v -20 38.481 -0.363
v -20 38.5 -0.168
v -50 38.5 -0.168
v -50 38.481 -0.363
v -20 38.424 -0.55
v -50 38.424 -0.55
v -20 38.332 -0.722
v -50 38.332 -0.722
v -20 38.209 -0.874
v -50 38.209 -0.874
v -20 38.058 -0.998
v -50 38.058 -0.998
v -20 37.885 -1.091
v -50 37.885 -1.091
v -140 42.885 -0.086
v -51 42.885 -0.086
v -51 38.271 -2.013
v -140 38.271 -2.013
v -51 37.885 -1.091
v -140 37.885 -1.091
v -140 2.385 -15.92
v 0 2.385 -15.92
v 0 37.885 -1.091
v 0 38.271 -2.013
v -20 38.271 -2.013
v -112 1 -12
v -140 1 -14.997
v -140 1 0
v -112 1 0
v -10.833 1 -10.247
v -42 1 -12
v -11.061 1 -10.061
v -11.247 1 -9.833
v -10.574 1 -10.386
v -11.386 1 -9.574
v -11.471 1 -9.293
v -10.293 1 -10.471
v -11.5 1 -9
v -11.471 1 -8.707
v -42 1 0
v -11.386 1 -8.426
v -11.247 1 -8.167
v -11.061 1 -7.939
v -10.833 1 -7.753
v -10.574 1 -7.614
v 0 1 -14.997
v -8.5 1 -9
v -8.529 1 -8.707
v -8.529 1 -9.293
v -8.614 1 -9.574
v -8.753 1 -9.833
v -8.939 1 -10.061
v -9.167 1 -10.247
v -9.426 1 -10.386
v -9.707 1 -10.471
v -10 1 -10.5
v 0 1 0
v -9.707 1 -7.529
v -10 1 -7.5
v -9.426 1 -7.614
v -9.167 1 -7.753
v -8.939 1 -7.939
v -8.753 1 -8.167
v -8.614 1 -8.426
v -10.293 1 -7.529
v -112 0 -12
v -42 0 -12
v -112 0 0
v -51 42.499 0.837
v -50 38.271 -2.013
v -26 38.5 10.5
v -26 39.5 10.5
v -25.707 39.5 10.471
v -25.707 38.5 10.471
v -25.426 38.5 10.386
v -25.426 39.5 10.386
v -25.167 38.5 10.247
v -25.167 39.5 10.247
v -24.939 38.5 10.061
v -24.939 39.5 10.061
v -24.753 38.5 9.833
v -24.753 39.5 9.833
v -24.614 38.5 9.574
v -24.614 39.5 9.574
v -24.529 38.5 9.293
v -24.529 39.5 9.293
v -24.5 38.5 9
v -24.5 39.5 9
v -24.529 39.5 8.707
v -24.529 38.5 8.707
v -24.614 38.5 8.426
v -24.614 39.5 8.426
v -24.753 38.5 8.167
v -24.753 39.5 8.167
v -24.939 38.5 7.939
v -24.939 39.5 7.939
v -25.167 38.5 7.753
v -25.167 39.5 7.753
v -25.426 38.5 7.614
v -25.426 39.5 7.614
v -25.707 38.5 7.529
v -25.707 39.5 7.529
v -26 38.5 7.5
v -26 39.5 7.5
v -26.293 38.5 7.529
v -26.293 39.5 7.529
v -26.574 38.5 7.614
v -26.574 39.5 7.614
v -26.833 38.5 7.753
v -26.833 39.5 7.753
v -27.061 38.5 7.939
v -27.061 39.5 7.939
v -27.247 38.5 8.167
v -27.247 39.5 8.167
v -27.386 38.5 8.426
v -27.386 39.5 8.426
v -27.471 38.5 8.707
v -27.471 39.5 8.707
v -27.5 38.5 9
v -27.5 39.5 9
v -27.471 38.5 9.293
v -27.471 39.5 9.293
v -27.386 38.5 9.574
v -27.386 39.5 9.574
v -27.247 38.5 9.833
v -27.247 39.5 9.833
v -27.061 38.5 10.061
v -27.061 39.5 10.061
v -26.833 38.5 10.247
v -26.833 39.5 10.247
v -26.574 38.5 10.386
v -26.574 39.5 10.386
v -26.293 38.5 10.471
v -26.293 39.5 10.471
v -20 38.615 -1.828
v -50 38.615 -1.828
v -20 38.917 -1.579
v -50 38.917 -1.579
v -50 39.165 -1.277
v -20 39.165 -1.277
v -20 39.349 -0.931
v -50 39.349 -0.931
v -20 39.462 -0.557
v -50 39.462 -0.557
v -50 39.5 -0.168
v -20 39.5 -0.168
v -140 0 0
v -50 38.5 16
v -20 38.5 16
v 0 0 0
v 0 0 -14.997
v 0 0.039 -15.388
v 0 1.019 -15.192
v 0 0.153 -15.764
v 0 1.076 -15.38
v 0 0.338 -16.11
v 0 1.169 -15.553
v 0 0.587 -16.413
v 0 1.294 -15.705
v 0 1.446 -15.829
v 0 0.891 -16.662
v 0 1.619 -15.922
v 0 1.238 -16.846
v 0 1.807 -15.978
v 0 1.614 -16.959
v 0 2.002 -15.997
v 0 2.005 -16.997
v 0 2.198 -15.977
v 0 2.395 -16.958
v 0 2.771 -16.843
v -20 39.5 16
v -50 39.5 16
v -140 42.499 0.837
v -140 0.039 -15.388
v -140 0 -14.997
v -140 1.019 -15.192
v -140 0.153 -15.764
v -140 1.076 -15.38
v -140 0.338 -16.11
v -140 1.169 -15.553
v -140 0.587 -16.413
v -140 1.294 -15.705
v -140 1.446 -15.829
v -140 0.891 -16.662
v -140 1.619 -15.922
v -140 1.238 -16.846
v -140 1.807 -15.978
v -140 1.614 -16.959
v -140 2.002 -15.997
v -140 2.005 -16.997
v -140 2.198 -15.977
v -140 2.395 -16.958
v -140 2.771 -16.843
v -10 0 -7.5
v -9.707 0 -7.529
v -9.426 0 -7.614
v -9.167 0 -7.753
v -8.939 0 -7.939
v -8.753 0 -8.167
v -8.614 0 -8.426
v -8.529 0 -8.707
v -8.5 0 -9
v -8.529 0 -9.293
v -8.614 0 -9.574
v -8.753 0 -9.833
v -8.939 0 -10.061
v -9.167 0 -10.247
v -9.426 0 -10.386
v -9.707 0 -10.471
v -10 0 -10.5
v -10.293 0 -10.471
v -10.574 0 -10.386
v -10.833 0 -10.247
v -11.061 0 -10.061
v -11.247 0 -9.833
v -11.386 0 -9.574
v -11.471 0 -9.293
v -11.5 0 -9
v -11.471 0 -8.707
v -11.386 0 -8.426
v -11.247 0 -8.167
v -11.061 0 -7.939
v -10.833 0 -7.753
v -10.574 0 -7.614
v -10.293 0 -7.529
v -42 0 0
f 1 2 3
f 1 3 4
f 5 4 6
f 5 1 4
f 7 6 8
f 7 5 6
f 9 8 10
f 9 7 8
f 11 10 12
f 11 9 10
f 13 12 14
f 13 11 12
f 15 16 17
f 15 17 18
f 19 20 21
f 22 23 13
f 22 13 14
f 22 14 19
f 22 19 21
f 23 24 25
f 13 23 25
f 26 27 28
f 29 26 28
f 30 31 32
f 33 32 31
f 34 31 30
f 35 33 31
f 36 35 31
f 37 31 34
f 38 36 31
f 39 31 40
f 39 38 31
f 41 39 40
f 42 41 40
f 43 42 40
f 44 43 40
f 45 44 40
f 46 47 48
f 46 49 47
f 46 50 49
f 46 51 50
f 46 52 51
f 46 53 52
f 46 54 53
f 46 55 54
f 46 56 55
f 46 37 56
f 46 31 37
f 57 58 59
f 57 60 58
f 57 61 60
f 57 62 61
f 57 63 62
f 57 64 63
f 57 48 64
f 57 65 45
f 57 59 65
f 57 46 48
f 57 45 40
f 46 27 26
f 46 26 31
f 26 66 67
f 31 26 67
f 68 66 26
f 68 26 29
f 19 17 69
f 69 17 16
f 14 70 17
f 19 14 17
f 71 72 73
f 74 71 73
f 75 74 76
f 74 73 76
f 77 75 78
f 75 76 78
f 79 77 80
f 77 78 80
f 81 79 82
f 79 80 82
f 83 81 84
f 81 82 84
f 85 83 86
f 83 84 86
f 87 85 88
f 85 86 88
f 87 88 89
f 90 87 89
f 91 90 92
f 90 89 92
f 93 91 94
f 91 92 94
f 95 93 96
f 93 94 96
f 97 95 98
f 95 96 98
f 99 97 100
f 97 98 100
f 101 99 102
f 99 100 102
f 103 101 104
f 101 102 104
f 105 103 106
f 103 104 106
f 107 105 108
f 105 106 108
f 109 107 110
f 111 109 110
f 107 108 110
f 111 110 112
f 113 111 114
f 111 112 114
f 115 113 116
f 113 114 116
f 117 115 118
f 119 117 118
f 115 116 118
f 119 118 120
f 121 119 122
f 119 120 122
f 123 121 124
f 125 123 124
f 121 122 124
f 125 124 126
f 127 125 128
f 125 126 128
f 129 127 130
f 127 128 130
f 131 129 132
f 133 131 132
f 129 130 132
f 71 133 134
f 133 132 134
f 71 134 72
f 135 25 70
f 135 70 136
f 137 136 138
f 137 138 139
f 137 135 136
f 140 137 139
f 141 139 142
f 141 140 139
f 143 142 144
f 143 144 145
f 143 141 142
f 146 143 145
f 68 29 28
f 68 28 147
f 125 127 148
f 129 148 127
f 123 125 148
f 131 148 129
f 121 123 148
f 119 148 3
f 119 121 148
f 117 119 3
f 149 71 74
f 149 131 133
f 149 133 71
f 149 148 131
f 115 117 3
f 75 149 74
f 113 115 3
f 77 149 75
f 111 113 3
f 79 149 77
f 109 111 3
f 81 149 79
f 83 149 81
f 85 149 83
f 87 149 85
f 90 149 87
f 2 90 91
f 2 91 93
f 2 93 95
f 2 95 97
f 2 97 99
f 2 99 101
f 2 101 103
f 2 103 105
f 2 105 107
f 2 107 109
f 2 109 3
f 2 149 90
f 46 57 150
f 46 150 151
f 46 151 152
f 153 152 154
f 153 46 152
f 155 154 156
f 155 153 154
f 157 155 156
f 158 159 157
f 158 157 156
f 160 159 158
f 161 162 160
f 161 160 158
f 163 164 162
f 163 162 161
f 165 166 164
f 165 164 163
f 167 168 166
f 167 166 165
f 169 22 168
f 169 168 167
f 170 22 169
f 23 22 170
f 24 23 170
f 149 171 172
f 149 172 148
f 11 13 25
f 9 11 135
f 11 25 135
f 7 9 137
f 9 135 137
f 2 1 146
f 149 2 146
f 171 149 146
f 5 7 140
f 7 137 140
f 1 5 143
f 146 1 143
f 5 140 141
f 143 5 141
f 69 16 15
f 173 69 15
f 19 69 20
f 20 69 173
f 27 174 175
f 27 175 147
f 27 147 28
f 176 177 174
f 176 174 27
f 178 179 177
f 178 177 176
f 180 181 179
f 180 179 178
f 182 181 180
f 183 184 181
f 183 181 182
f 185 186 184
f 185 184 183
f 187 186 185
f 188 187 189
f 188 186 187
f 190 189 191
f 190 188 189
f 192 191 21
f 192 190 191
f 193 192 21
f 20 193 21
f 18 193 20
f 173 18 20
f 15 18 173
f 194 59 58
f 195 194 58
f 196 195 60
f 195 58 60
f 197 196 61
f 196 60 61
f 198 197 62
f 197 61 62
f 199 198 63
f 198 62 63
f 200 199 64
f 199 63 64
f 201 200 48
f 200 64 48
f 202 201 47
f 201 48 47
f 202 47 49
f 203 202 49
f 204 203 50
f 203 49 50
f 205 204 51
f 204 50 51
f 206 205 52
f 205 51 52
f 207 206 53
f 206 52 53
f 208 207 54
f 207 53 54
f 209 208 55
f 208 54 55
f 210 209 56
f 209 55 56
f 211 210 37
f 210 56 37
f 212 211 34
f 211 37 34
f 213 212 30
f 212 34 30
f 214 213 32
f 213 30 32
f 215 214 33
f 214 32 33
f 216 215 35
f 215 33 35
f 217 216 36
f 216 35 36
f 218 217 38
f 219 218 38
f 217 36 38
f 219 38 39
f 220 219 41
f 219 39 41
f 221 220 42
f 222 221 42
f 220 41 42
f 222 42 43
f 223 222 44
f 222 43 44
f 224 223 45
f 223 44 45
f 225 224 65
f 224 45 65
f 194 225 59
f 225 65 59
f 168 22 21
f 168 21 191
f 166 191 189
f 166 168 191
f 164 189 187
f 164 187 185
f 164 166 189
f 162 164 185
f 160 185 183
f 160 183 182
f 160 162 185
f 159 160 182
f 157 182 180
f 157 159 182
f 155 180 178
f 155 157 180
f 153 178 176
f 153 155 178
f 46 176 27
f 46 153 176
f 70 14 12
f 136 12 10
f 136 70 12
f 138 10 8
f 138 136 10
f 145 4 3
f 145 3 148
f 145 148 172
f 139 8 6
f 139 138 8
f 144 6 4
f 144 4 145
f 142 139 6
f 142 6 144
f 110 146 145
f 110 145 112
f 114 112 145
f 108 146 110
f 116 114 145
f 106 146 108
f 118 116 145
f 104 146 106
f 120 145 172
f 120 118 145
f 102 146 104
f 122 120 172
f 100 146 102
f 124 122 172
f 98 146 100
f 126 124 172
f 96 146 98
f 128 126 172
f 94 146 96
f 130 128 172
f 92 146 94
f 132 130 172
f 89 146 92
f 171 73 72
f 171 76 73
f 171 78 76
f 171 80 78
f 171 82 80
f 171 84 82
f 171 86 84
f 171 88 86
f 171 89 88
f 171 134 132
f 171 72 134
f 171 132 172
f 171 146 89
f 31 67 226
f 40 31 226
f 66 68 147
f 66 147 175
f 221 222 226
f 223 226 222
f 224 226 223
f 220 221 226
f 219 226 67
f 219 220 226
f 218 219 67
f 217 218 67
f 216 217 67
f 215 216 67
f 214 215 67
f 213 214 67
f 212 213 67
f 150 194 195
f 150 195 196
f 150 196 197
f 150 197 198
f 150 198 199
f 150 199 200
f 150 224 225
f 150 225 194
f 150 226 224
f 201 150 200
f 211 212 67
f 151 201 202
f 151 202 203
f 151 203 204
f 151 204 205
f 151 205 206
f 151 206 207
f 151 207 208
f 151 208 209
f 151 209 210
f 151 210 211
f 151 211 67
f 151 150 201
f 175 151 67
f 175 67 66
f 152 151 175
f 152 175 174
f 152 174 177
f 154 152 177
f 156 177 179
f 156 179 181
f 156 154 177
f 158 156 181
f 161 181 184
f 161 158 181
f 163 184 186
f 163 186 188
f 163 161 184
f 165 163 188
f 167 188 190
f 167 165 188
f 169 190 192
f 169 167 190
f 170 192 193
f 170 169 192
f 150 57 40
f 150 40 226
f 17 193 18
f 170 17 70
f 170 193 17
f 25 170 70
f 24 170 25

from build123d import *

# Parameters (mm, degrees)
T_LE_DE_BASE_PLI_E1_DEPTH = 140
ESQUISSE6_W               = 70
ESQUISSE6_H               = 12
ENL_V_MAT_EXTRU_1_DEPTH   = 1
ESQUISSE7_W               = 90
ESQUISSE7_H               = 8.077316225
ESQUISSE7_W_2             = 20
ENL_V_MAT_EXTRU_2_DEPTH   = 148.230392024
ESQUISSE8_W               = 89
ESQUISSE8_H               = 5
PATTE1_DEPTH              = 1
ESQUISSE11_R              = 1.5
ENL_V_MAT_EXTRU_3_DEPTH   = 1
ESQUISSE12_R              = 1.5
ENL_V_MAT_EXTRU_4_DEPTH   = 1


# Sheet-metal steps are written as plain solids
with BuildPart() as part:
    # Esquisse1 → Tôle de base pliée1 (new body)
    with BuildSketch(Plane(origin=(0, 0, 0), x_dir=(0, 0, -1), z_dir=(1, 0, 0))):
        with BuildLine():
            Line((0, 0), (14.997077996, 0))
            ThreePointArc((14.997077996, 0), (16.661676799, 0.891347294), (16.842539964, 2.770889177))
            Line((16.842539964, 2.770889177), (2.01342604, 38.270889177))
            ThreePointArc((2.01342604, 38.270889177), (1.276616778, 39.164598804), (0.167964072, 39.5))
            Line((0.167964072, 39.5), (-16, 39.5))
            Line((-16, 39.5), (-16, 38.5))
            Line((-16, 38.5), (0.167964072, 38.5))
            ThreePointArc((0.167964072, 38.5), (0.722290425, 38.332299402), (1.090695056, 37.885444588))
            Line((1.090695056, 37.885444588), (15.91980898, 2.385444588))
            ThreePointArc((15.91980898, 2.385444588), (15.829377397, 1.445673647), (14.997077996, 1))
            Line((14.997077996, 1), (0, 1))
            Line((0, 1), (0, 0))
        make_face()
    extrude(amount=-T_LE_DE_BASE_PLI_E1_DEPTH)

    # Esquisse6 → Enlèv. mat.-Extru.1 (cut)
    with BuildSketch(Plane.XZ):
        with Locations((-77, -6)):
            Rectangle(ESQUISSE6_W, ESQUISSE6_H)
    extrude(amount=-ENL_V_MAT_EXTRU_1_DEPTH, mode=Mode.SUBTRACT)

    # Esquisse7 → Enlèv. mat.-Extru.2 (cut, through all)
    with BuildSketch(Plane(origin=(0, 6.401909959, -15.325784447), x_dir=(-1, 0, 0), z_dir=(0, 0.38544458835969, -0.9227309842550152))):
        with Locations((95, 38.57632918)):
            Rectangle(ESQUISSE7_W, ESQUISSE7_H)
        with Locations((10, 38.57632918)):
            Rectangle(ESQUISSE7_W_2, ESQUISSE7_H)
    extrude(amount=-ENL_V_MAT_EXTRU_2_DEPTH, mode=Mode.SUBTRACT)

    # Esquisse8 → Patte1 (add)
    with BuildSketch(Plane(origin=(0, 6.401909959, -15.325784447), x_dir=(-1, 0, 0), z_dir=(0, 0.38544458835969003, -0.9227309842550152))):
        with Locations((95.5, 37.037671067)):
            Rectangle(ESQUISSE8_W, ESQUISSE8_H)
    extrude(amount=-PATTE1_DEPTH)

    # Esquisse11 → Enlèv. mat.-Extru.3 (cut)
    with BuildSketch(Plane(origin=(0, 1, 0), x_dir=(1, 0, 0), z_dir=(0, 1, 0))):
        with Locations(Location((-10, 9, 0), (0, 0, 270))):
            Circle(ESQUISSE11_R)
    extrude(amount=-ENL_V_MAT_EXTRU_3_DEPTH, mode=Mode.SUBTRACT)

    # Esquisse12 → Enlèv. mat.-Extru.4 (cut)
    with BuildSketch(Plane(origin=(0, 39.5, 0), x_dir=(1, 0, 0), z_dir=(0, 1, 0))):
        with Locations(Location((-26, -9, 0), (0, 0, 270))):
            Circle(ESQUISSE12_R)
    extrude(amount=-ENL_V_MAT_EXTRU_4_DEPTH, mode=Mode.SUBTRACT)


solid = part.part
